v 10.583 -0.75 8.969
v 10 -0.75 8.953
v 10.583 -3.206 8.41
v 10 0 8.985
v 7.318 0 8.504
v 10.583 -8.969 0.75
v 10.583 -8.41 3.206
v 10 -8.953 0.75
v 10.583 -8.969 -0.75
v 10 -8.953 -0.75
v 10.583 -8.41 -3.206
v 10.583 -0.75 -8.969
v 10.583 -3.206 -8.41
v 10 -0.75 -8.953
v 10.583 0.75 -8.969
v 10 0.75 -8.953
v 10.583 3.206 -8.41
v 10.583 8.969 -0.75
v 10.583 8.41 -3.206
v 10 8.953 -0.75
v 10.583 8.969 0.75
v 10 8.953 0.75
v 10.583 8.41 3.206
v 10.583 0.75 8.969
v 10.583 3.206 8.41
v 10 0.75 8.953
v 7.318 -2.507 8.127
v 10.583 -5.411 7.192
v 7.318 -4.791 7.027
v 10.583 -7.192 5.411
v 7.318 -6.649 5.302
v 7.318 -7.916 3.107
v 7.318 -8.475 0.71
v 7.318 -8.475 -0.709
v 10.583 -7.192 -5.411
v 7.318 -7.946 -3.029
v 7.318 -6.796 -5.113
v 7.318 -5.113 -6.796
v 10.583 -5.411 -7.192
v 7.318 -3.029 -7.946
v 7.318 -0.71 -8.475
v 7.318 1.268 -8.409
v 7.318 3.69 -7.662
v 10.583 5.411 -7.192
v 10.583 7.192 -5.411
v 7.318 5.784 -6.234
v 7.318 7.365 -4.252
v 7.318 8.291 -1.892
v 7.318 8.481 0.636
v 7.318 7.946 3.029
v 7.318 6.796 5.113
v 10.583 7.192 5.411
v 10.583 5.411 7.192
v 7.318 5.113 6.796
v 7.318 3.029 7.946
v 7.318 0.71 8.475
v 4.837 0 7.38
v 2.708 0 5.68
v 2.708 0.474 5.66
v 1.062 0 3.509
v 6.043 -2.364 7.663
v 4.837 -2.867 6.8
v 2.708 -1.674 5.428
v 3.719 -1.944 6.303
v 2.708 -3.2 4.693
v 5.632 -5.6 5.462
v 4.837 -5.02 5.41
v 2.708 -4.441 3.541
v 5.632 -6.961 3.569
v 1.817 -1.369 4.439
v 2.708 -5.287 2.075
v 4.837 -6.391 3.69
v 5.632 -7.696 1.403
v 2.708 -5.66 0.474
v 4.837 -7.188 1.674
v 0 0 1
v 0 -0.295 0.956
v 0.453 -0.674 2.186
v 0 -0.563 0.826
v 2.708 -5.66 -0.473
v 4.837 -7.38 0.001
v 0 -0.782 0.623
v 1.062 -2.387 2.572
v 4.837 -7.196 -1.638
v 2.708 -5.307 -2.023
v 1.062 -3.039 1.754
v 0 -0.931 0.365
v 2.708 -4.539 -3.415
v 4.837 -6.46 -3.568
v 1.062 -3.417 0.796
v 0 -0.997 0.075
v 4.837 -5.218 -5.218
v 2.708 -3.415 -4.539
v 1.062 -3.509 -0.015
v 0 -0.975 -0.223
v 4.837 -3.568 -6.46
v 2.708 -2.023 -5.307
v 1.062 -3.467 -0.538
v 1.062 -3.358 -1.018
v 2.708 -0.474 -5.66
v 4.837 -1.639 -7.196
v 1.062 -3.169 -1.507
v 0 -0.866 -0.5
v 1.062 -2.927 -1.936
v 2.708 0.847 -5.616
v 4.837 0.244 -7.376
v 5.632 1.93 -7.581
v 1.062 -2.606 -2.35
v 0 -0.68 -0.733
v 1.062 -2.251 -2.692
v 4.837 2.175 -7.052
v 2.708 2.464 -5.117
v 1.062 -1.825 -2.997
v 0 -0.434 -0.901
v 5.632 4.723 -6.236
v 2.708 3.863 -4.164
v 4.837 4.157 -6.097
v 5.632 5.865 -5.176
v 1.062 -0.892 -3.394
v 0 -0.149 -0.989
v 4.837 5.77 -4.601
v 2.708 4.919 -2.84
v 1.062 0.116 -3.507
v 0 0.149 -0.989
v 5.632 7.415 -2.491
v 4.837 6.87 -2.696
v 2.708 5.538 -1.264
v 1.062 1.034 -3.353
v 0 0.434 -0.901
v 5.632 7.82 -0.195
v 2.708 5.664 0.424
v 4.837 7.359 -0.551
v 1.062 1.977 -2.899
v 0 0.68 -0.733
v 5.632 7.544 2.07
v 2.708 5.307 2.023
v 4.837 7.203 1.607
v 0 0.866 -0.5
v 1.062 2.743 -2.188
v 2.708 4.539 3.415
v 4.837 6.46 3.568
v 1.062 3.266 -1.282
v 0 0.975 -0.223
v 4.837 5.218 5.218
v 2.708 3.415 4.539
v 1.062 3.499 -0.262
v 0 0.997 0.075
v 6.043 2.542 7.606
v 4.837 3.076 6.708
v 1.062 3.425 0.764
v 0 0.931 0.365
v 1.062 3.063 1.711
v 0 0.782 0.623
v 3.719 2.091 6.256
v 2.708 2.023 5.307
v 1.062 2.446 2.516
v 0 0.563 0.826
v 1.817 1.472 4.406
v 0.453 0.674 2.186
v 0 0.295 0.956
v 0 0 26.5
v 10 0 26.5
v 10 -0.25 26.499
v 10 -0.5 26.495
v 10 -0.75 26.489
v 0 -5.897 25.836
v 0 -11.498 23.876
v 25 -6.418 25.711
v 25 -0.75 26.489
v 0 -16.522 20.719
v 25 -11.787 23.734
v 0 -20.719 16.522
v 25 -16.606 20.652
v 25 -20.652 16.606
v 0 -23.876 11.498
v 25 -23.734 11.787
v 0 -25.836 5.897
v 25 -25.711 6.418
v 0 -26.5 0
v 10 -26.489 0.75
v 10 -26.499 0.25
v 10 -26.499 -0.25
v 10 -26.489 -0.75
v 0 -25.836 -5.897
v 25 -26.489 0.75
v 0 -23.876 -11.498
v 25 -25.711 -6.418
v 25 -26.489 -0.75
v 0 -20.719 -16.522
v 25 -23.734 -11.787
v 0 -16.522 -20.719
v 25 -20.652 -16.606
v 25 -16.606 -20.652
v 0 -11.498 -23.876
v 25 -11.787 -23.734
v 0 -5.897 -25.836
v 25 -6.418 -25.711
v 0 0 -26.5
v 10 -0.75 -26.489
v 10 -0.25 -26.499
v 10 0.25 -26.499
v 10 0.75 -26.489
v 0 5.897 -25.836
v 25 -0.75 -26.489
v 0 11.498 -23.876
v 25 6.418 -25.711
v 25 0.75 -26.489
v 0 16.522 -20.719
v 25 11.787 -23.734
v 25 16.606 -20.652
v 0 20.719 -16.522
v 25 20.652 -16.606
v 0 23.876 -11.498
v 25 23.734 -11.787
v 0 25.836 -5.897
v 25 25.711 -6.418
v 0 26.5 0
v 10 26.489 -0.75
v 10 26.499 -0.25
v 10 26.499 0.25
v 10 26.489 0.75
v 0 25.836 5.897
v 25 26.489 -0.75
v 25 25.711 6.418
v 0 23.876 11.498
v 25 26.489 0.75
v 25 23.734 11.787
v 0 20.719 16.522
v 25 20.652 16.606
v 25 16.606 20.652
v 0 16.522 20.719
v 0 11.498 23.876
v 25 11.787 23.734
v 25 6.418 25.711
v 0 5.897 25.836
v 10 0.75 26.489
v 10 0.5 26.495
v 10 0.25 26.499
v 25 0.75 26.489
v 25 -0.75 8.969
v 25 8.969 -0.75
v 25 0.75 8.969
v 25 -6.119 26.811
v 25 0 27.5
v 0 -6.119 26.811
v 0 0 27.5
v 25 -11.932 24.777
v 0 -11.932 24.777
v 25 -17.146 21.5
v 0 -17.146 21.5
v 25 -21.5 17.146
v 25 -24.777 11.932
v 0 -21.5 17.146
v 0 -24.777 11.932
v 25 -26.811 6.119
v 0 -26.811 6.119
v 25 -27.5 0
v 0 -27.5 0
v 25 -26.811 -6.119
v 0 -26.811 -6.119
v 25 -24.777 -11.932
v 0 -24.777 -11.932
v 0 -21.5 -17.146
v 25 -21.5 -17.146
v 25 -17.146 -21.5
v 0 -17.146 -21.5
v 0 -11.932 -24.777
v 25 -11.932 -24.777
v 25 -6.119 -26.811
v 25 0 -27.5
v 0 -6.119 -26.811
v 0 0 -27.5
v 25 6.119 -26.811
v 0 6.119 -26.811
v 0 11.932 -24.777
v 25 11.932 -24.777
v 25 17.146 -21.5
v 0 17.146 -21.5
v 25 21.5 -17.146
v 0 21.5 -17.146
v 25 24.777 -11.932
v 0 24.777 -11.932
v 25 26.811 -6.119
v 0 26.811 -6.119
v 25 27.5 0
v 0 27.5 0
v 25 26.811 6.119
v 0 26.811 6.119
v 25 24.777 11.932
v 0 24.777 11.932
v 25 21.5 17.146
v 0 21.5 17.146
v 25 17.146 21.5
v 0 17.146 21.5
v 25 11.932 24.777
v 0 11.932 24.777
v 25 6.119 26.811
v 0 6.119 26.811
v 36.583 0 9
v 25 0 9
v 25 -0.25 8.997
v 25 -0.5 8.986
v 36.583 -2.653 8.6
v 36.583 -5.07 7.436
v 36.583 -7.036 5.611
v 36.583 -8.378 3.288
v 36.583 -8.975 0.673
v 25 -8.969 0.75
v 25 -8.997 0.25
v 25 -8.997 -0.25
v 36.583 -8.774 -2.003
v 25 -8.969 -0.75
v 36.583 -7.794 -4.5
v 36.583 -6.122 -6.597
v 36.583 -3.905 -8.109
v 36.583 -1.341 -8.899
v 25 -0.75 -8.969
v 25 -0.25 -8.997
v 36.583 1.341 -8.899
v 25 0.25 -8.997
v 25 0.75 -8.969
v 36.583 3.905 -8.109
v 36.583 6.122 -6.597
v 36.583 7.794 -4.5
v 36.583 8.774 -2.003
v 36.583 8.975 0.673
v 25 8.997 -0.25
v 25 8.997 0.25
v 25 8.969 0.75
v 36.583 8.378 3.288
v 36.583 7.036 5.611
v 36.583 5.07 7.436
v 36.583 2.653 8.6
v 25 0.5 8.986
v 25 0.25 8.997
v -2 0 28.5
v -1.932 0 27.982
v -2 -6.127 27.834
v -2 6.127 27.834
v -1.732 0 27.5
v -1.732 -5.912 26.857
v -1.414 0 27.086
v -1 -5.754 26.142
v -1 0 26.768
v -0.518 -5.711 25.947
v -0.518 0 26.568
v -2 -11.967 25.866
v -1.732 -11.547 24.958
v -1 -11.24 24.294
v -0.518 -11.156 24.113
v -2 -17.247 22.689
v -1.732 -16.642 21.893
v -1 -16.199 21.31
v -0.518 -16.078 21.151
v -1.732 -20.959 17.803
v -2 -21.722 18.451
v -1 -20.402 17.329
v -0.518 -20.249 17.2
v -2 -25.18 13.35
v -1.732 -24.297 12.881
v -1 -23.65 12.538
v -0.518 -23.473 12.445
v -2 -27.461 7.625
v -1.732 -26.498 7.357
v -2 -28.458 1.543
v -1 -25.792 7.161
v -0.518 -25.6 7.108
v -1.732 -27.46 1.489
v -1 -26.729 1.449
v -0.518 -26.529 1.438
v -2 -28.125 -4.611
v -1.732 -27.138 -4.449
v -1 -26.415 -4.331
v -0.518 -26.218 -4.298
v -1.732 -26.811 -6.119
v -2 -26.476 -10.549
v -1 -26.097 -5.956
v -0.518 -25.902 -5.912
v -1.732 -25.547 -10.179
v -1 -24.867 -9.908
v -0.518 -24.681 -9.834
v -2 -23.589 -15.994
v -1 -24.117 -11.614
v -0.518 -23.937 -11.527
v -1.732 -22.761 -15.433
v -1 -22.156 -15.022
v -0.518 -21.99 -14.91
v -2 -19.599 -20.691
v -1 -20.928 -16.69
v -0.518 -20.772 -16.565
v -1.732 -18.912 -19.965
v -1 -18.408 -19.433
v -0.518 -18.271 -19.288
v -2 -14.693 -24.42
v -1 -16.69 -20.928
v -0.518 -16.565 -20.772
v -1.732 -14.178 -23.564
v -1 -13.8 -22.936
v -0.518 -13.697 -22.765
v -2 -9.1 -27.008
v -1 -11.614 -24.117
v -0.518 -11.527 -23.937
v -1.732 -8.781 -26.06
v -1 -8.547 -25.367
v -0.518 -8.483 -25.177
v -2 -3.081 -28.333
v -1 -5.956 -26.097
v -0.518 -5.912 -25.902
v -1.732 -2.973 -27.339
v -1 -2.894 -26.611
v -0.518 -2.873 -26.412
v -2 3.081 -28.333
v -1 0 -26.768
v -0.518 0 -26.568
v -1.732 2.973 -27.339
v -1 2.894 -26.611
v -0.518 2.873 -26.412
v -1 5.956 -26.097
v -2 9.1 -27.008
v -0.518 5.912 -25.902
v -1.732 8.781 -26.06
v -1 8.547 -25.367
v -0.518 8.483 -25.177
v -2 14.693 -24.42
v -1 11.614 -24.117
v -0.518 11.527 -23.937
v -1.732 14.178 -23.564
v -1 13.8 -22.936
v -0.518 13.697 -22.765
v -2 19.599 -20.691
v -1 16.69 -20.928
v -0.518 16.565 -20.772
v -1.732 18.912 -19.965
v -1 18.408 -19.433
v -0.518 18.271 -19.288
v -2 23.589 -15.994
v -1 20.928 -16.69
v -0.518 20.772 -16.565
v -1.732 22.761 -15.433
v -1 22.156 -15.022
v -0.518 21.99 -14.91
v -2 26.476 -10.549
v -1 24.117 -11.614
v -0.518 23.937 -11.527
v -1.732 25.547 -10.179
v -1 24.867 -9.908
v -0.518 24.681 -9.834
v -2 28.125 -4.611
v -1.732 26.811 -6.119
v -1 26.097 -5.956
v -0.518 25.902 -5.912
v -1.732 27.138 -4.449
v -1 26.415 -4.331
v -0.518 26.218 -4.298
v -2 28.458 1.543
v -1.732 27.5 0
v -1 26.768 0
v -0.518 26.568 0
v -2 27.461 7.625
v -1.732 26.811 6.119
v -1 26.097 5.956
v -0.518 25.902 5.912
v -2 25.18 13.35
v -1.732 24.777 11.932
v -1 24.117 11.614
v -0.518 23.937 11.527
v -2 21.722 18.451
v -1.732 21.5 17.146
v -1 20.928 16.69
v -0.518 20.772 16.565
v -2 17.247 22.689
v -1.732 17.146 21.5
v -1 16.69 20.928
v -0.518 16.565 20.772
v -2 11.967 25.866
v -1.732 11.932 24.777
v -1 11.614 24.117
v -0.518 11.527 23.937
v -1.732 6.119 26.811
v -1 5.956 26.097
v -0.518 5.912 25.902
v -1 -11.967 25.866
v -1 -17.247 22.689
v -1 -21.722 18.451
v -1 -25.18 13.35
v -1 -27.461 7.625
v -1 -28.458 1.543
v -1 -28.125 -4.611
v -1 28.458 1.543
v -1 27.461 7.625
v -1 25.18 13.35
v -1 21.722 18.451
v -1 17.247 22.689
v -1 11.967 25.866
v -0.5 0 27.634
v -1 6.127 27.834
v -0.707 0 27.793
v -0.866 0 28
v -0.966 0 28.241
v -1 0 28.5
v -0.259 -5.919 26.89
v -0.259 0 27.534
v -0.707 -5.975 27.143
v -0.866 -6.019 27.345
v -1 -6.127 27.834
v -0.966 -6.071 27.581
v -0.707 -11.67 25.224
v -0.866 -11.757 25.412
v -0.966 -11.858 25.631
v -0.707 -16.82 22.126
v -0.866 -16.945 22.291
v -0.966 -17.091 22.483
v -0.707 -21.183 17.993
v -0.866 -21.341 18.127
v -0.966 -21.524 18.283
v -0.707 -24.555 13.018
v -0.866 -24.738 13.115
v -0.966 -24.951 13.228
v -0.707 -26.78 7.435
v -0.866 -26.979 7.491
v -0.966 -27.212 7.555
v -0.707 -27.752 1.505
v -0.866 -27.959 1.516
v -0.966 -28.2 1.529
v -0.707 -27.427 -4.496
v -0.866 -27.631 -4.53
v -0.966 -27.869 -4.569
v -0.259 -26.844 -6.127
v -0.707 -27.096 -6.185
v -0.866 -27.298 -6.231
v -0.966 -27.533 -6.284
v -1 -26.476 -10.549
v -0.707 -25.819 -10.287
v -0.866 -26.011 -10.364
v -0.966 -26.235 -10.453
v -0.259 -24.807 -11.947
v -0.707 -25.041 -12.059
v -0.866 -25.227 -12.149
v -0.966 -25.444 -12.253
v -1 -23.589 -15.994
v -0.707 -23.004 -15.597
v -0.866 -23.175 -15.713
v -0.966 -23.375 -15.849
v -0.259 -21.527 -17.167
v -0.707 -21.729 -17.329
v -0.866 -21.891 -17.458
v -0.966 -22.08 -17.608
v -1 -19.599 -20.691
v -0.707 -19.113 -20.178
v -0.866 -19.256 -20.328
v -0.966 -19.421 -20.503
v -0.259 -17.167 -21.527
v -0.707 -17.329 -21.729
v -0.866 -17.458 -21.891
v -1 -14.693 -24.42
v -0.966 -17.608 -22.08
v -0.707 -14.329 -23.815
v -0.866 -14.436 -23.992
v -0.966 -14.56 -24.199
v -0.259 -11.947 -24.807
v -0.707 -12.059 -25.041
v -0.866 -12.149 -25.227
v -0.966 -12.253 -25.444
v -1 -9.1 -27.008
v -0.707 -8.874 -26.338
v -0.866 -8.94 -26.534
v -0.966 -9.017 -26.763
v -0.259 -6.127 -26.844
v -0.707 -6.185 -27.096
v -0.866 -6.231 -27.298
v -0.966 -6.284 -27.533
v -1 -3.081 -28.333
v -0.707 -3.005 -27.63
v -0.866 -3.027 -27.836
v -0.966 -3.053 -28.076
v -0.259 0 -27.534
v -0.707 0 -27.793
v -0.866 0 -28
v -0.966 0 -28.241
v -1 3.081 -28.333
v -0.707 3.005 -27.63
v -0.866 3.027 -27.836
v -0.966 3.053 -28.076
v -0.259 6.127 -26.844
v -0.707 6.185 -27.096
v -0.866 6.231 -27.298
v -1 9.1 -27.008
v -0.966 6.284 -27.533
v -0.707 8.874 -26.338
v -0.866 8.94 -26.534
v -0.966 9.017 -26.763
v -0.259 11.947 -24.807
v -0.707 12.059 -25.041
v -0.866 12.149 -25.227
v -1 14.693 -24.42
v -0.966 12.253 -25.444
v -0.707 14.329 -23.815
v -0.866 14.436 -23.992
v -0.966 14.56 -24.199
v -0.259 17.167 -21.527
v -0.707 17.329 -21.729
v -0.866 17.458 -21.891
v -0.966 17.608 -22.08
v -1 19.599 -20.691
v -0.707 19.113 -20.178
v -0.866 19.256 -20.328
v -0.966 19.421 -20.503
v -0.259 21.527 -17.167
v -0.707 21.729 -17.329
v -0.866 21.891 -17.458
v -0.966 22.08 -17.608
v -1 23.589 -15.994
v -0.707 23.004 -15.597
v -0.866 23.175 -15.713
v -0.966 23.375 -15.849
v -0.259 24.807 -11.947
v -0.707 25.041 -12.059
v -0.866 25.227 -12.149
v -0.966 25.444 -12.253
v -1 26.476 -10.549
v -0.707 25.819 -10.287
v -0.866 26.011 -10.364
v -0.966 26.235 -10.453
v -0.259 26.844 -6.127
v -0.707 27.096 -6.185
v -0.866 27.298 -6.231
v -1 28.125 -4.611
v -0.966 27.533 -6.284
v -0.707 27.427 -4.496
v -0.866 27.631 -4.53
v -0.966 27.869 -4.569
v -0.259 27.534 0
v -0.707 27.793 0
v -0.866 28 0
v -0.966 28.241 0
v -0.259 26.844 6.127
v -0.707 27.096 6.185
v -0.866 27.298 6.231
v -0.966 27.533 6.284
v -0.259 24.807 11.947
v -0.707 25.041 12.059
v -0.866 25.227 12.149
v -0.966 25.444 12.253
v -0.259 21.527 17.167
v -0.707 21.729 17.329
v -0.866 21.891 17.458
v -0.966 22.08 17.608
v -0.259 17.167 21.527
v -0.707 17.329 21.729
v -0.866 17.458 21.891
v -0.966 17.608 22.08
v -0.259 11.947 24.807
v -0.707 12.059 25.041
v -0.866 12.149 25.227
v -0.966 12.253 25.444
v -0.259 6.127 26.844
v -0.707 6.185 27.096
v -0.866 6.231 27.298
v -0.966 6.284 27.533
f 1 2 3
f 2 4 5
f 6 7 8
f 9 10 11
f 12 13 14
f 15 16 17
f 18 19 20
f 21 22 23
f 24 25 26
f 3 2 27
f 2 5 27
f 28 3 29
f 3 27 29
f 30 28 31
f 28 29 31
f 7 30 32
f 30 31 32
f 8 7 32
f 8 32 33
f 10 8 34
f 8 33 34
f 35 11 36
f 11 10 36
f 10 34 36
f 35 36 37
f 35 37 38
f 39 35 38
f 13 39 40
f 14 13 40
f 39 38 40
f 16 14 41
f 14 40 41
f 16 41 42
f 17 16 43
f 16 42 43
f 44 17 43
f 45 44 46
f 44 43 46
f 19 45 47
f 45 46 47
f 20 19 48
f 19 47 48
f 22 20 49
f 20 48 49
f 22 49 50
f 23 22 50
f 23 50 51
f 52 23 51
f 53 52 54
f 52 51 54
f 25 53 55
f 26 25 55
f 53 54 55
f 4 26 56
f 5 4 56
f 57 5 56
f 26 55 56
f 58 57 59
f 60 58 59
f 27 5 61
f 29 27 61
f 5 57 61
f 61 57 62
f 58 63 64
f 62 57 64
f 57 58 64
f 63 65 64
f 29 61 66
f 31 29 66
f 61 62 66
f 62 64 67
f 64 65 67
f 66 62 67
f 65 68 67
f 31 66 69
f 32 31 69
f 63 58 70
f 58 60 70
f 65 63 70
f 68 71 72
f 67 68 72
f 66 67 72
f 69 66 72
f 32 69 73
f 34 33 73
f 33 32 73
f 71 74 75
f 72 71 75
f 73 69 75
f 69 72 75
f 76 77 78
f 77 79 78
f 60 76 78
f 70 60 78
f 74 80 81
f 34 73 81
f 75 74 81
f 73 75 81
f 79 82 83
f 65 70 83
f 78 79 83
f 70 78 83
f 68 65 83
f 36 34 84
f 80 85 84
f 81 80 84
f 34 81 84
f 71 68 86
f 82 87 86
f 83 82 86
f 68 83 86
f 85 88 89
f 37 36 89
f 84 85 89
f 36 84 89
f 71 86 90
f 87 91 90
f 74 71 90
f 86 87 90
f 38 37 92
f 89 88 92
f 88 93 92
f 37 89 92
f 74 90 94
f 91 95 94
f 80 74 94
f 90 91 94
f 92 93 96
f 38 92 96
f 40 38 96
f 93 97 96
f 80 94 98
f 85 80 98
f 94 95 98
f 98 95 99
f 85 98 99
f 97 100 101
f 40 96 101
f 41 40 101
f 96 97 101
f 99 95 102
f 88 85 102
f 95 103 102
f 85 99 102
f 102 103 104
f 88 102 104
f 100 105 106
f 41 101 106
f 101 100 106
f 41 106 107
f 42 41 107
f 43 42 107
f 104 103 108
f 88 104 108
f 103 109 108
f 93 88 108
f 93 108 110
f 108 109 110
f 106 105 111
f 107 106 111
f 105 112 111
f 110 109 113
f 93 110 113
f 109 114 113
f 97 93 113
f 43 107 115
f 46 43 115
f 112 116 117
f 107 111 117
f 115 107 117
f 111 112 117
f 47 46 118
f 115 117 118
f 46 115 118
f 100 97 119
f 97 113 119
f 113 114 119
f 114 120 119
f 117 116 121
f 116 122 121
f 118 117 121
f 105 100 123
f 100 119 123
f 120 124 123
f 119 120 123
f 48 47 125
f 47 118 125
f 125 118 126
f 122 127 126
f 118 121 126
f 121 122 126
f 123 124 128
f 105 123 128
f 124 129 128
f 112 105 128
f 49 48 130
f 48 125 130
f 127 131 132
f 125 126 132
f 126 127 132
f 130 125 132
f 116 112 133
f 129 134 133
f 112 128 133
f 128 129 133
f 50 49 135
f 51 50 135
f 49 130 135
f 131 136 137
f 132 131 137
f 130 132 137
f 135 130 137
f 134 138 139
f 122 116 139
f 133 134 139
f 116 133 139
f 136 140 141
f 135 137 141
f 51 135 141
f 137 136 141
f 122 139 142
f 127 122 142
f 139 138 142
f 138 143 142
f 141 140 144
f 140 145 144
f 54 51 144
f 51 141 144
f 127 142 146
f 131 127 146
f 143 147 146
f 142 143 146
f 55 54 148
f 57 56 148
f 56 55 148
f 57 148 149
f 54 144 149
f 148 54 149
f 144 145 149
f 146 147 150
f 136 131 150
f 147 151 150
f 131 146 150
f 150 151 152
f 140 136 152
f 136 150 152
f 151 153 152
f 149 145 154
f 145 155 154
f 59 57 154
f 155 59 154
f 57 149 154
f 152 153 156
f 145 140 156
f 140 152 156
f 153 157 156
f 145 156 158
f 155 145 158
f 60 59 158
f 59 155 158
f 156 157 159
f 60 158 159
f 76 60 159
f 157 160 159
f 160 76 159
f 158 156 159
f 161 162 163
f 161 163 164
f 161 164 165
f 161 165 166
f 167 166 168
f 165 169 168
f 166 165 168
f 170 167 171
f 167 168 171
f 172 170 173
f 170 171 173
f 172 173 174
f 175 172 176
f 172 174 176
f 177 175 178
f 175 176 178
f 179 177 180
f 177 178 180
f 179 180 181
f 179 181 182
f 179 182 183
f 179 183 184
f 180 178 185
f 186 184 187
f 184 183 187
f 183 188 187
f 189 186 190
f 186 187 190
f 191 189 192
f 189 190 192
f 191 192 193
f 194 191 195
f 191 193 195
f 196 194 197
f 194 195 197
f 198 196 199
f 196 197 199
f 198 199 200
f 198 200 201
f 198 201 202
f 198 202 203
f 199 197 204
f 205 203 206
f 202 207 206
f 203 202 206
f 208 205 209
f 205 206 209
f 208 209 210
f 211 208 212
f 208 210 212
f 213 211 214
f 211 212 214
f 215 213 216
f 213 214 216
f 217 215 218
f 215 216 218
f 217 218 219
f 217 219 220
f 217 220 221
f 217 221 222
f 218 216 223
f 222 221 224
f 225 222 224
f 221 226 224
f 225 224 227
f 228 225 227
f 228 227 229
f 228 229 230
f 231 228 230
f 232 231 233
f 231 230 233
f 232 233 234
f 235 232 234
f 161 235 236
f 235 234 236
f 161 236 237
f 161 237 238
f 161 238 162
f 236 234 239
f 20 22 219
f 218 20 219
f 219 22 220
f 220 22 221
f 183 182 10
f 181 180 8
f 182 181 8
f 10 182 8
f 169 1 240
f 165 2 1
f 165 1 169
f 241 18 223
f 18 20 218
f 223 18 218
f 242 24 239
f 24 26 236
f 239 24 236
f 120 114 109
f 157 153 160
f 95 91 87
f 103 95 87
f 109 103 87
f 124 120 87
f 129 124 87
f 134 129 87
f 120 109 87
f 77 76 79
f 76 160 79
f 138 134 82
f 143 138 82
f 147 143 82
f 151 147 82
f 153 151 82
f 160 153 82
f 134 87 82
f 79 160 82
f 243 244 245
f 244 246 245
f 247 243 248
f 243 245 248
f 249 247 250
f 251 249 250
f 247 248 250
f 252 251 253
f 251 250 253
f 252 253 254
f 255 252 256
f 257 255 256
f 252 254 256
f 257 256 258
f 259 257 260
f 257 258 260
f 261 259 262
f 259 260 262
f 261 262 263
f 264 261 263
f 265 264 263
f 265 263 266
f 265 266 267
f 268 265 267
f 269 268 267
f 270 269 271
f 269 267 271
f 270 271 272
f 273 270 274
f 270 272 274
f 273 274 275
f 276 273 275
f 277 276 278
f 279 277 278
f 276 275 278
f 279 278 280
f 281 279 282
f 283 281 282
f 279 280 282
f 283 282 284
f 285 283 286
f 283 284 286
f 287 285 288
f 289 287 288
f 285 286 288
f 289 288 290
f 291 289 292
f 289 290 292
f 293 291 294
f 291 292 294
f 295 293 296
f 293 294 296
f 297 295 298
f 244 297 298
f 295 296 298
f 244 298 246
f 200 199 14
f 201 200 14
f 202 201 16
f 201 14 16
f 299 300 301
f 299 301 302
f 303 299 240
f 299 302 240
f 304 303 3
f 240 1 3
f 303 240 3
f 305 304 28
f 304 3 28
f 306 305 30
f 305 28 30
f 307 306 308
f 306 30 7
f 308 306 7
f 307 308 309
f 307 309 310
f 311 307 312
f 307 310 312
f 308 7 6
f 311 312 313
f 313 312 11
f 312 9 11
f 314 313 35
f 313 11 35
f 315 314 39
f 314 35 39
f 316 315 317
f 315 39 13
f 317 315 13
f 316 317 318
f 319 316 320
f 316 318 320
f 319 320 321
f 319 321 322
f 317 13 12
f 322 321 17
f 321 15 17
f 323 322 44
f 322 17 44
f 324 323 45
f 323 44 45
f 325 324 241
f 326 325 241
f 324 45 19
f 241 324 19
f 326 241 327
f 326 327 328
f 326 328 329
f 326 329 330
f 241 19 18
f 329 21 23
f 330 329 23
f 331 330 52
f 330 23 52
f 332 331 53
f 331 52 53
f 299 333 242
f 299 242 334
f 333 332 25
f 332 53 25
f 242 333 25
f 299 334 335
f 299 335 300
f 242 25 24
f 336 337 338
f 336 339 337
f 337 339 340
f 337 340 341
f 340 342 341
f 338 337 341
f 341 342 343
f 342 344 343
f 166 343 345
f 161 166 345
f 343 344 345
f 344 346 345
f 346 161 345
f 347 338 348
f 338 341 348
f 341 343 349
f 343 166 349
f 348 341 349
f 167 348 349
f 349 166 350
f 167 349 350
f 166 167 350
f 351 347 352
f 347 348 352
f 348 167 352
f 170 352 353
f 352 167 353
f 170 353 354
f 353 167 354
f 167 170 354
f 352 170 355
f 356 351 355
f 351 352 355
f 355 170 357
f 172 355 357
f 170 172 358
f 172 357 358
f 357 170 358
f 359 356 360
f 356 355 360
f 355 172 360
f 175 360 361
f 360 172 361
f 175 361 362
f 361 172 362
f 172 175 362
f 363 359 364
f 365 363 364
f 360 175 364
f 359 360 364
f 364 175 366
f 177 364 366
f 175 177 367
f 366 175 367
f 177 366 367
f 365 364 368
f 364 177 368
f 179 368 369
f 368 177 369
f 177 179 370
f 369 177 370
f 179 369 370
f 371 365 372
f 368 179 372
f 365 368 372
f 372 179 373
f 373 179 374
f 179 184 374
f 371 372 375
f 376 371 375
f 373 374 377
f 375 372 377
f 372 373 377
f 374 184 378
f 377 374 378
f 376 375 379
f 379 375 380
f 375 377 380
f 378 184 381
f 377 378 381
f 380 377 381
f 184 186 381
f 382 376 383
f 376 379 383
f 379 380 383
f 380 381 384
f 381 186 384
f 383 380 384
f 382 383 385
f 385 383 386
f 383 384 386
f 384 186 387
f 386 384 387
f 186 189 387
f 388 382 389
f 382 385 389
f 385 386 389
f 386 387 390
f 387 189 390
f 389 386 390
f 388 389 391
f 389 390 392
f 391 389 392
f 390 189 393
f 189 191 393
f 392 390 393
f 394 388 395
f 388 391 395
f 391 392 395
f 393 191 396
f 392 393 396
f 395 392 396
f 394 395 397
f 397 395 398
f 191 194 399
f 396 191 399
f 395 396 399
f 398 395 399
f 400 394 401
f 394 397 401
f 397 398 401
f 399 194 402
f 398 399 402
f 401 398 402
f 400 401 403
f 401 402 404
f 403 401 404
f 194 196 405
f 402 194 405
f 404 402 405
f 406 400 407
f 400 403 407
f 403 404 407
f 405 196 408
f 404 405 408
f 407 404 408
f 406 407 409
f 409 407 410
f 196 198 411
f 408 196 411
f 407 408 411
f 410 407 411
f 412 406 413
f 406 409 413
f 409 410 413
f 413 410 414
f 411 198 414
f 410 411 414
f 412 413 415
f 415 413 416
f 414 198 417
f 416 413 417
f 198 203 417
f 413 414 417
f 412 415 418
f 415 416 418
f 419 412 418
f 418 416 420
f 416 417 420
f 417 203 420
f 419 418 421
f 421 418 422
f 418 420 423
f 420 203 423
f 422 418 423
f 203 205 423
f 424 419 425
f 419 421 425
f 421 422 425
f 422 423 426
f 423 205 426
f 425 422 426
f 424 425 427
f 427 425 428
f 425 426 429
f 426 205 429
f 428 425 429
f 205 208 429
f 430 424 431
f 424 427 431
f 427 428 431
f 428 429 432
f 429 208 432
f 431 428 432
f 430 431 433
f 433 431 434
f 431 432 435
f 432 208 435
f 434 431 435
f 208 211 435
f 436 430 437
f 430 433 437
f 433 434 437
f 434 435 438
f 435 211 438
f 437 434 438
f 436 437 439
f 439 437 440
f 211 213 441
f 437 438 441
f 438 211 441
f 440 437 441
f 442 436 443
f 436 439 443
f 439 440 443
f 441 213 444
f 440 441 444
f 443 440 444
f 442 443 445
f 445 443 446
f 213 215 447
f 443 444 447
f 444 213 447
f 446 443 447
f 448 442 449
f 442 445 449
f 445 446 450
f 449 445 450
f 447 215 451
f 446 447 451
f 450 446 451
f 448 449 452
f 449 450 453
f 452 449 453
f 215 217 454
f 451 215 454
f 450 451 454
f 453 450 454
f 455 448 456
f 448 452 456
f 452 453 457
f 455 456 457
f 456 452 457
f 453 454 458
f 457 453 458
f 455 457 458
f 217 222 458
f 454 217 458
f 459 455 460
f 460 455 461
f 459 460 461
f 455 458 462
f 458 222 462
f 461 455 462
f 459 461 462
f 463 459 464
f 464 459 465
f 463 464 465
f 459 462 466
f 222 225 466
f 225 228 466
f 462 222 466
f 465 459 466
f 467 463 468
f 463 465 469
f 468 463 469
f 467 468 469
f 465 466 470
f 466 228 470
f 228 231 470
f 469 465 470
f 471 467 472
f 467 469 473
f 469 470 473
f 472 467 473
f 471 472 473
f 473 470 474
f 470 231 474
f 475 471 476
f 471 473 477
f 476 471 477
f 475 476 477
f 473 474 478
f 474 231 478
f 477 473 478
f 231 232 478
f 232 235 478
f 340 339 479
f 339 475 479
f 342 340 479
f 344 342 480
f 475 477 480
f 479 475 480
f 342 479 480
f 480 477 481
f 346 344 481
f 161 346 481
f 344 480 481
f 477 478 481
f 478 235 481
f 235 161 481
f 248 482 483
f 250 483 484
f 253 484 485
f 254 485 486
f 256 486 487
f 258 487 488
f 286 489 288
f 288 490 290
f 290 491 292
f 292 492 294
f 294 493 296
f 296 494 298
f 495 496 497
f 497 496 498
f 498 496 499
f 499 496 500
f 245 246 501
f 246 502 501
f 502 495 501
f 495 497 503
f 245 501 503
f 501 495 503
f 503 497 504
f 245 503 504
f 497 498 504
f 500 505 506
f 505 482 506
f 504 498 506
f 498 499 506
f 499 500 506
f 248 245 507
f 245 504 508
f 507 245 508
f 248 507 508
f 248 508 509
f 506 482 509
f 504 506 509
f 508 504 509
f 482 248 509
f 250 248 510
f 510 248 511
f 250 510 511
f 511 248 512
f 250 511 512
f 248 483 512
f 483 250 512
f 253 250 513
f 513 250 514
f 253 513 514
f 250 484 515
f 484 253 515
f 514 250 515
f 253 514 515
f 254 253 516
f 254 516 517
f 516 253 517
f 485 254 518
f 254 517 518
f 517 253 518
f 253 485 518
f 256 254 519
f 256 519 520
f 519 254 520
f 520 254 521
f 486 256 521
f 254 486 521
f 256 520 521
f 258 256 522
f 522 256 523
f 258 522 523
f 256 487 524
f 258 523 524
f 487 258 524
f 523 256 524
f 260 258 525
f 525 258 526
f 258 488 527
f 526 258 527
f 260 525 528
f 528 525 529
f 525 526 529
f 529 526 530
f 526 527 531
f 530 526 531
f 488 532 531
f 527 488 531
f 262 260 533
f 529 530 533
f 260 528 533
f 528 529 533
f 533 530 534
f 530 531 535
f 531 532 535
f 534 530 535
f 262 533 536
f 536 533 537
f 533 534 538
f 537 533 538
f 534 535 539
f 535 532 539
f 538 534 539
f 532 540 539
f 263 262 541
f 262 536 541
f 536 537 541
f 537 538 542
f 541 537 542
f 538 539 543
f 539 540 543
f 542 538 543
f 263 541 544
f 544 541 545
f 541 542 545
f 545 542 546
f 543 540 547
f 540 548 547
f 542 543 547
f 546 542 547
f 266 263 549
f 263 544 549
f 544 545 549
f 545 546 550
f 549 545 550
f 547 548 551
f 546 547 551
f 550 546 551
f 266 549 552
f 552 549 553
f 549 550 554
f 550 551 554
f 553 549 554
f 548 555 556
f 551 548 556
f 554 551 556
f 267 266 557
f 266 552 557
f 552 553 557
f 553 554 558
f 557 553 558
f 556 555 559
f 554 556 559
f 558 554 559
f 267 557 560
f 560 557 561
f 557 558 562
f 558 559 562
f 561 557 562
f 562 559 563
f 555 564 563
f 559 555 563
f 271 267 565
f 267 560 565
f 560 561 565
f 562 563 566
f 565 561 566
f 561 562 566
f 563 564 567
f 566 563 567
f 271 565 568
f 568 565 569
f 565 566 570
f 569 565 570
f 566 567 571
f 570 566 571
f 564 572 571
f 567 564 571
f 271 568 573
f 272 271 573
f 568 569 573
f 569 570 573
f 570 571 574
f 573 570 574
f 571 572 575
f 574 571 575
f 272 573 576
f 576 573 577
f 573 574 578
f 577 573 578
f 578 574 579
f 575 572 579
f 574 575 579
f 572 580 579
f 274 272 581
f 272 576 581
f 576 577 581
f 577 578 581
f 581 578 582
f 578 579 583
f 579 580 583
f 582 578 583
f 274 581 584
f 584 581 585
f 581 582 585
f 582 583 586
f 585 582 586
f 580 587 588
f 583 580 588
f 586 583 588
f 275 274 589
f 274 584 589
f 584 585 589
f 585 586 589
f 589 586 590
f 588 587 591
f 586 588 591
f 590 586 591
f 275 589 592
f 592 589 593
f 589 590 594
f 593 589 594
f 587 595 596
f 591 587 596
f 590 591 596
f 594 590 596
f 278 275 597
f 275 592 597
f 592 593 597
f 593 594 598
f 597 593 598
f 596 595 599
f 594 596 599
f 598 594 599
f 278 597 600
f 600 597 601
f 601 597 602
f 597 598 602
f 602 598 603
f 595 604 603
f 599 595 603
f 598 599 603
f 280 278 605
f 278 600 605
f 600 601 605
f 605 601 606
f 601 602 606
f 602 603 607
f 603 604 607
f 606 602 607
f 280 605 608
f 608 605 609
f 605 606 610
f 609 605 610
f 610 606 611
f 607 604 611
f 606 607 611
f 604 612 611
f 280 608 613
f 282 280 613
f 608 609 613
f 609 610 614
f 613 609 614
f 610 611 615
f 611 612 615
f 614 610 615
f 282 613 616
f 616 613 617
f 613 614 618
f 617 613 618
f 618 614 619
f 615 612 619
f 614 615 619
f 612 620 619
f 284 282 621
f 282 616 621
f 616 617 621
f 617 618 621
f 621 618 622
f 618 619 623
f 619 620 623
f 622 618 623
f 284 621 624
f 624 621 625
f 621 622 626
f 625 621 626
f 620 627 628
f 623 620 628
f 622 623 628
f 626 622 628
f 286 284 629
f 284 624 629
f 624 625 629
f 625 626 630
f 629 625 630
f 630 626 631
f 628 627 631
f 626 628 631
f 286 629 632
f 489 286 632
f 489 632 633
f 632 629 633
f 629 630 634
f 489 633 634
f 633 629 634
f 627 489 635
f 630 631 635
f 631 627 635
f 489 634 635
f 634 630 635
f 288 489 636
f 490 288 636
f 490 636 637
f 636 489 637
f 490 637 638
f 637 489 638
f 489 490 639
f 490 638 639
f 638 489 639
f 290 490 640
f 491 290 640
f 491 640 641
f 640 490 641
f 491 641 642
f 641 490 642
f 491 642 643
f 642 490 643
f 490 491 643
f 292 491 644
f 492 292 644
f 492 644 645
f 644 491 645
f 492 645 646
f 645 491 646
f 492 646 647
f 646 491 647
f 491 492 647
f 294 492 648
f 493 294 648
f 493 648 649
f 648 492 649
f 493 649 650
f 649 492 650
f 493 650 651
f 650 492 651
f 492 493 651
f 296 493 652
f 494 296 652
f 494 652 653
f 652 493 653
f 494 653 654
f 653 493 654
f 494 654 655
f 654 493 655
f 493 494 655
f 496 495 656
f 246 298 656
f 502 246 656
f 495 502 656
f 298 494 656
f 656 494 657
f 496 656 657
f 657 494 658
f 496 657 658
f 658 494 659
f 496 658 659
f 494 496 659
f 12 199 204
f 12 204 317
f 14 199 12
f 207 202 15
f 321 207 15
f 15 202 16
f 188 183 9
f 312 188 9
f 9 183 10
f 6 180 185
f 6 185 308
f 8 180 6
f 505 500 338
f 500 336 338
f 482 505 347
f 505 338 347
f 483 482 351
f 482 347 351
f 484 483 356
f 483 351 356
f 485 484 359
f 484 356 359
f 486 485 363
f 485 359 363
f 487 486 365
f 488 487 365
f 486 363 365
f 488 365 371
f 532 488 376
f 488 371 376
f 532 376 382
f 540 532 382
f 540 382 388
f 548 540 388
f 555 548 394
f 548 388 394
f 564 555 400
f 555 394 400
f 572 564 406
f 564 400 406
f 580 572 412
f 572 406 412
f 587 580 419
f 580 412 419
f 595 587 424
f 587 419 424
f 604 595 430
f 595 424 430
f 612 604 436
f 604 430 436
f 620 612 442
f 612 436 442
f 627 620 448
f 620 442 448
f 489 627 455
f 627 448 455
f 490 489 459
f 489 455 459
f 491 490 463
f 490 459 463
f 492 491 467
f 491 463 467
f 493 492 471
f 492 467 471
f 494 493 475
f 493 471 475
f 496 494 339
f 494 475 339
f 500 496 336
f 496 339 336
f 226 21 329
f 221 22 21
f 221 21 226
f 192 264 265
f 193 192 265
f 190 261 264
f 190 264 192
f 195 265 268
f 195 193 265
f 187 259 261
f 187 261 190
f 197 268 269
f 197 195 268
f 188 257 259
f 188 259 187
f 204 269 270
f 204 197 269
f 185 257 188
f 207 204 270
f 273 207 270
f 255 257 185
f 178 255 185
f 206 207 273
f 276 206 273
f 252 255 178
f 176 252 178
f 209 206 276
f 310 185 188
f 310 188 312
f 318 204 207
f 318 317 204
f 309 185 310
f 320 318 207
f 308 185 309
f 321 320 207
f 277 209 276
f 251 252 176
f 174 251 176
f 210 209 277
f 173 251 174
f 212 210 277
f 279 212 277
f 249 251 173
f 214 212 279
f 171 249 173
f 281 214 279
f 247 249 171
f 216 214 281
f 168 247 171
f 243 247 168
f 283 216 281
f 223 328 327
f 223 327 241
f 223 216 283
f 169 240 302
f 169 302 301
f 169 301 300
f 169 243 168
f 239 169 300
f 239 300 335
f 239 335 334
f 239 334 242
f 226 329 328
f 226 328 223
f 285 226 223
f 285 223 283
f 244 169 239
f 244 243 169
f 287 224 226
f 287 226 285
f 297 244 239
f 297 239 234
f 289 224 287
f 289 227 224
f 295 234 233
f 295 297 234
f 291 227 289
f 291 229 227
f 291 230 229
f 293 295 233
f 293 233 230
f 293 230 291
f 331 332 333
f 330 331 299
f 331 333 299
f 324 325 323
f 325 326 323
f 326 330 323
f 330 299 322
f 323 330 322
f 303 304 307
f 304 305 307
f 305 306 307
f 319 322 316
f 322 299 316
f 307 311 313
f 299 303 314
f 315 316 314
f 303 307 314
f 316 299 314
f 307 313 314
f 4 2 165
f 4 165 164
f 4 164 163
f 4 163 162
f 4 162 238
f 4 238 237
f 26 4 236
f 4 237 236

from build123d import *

# Parameters (mm, degrees)
F3_START = 10
F2_W     = 1.5
F2_H     = 19
F2_W_2   = 19
F2_H_2   = 1.5
F3_DEPTH = 15


with BuildPart() as f1:
    # F0 (on Front) → F1 (revolve)
    with BuildSketch(Plane.XZ):
        with BuildLine():
            ThreePointArc((-2, 28.5), (-1.4142135624, 27.0857864376), (0, 26.5))
            Line((0, 26.5), (25, 26.5))
            Line((25, 26.5), (25, 27.5))
            Line((25, 27.5), (0, 27.5))
            ThreePointArc((0, 27.5), (-0.7071067812, 27.7928932188), (-1, 28.5))
            Line((-1, 28.5), (-2, 28.5))
        make_face()
    revolve(axis=Axis((19.6649903227, 0, 0), (1, 0, 0)))



with BuildPart() as f1b:
    # F0 (on Front) → F1, piece 2 (revolve)
    with BuildSketch(Plane.XZ):
        with BuildLine():
            Line((0, 1), (0, 0))
            Line((0, 0), (36.5830052443, 0))
            Line((36.5830052443, 0), (36.5830052443, 9))
            Line((36.5830052443, 9), (10.5830052443, 9))
            ThreePointArc((10.5830052443, 9), (3.9497556635, 6.7749643874), (0, 1))
        make_face()
    revolve(axis=Axis((19.6649903227, 0, 0), (1, 0, 0)))


with BuildPart() as f1_1:
    add(f1.part)

    add(f1b.part)  # F3 merges F1b
    # F2 (on Right) → F3 (join)
    with BuildSketch(Plane.YZ.offset(F3_START)):
        with Locations((0, 17.5)):
            Rectangle(F2_W, F2_H)
        with Locations((-17.5, 0)):
            Rectangle(F2_W_2, F2_H_2)
        with Locations((0, -17.5)):
            Rectangle(F2_W, F2_H)
        with Locations((17.5, 0)):
            Rectangle(F2_W_2, F2_H_2)
    extrude(amount=F3_DEPTH)


solid = f1_1.part
